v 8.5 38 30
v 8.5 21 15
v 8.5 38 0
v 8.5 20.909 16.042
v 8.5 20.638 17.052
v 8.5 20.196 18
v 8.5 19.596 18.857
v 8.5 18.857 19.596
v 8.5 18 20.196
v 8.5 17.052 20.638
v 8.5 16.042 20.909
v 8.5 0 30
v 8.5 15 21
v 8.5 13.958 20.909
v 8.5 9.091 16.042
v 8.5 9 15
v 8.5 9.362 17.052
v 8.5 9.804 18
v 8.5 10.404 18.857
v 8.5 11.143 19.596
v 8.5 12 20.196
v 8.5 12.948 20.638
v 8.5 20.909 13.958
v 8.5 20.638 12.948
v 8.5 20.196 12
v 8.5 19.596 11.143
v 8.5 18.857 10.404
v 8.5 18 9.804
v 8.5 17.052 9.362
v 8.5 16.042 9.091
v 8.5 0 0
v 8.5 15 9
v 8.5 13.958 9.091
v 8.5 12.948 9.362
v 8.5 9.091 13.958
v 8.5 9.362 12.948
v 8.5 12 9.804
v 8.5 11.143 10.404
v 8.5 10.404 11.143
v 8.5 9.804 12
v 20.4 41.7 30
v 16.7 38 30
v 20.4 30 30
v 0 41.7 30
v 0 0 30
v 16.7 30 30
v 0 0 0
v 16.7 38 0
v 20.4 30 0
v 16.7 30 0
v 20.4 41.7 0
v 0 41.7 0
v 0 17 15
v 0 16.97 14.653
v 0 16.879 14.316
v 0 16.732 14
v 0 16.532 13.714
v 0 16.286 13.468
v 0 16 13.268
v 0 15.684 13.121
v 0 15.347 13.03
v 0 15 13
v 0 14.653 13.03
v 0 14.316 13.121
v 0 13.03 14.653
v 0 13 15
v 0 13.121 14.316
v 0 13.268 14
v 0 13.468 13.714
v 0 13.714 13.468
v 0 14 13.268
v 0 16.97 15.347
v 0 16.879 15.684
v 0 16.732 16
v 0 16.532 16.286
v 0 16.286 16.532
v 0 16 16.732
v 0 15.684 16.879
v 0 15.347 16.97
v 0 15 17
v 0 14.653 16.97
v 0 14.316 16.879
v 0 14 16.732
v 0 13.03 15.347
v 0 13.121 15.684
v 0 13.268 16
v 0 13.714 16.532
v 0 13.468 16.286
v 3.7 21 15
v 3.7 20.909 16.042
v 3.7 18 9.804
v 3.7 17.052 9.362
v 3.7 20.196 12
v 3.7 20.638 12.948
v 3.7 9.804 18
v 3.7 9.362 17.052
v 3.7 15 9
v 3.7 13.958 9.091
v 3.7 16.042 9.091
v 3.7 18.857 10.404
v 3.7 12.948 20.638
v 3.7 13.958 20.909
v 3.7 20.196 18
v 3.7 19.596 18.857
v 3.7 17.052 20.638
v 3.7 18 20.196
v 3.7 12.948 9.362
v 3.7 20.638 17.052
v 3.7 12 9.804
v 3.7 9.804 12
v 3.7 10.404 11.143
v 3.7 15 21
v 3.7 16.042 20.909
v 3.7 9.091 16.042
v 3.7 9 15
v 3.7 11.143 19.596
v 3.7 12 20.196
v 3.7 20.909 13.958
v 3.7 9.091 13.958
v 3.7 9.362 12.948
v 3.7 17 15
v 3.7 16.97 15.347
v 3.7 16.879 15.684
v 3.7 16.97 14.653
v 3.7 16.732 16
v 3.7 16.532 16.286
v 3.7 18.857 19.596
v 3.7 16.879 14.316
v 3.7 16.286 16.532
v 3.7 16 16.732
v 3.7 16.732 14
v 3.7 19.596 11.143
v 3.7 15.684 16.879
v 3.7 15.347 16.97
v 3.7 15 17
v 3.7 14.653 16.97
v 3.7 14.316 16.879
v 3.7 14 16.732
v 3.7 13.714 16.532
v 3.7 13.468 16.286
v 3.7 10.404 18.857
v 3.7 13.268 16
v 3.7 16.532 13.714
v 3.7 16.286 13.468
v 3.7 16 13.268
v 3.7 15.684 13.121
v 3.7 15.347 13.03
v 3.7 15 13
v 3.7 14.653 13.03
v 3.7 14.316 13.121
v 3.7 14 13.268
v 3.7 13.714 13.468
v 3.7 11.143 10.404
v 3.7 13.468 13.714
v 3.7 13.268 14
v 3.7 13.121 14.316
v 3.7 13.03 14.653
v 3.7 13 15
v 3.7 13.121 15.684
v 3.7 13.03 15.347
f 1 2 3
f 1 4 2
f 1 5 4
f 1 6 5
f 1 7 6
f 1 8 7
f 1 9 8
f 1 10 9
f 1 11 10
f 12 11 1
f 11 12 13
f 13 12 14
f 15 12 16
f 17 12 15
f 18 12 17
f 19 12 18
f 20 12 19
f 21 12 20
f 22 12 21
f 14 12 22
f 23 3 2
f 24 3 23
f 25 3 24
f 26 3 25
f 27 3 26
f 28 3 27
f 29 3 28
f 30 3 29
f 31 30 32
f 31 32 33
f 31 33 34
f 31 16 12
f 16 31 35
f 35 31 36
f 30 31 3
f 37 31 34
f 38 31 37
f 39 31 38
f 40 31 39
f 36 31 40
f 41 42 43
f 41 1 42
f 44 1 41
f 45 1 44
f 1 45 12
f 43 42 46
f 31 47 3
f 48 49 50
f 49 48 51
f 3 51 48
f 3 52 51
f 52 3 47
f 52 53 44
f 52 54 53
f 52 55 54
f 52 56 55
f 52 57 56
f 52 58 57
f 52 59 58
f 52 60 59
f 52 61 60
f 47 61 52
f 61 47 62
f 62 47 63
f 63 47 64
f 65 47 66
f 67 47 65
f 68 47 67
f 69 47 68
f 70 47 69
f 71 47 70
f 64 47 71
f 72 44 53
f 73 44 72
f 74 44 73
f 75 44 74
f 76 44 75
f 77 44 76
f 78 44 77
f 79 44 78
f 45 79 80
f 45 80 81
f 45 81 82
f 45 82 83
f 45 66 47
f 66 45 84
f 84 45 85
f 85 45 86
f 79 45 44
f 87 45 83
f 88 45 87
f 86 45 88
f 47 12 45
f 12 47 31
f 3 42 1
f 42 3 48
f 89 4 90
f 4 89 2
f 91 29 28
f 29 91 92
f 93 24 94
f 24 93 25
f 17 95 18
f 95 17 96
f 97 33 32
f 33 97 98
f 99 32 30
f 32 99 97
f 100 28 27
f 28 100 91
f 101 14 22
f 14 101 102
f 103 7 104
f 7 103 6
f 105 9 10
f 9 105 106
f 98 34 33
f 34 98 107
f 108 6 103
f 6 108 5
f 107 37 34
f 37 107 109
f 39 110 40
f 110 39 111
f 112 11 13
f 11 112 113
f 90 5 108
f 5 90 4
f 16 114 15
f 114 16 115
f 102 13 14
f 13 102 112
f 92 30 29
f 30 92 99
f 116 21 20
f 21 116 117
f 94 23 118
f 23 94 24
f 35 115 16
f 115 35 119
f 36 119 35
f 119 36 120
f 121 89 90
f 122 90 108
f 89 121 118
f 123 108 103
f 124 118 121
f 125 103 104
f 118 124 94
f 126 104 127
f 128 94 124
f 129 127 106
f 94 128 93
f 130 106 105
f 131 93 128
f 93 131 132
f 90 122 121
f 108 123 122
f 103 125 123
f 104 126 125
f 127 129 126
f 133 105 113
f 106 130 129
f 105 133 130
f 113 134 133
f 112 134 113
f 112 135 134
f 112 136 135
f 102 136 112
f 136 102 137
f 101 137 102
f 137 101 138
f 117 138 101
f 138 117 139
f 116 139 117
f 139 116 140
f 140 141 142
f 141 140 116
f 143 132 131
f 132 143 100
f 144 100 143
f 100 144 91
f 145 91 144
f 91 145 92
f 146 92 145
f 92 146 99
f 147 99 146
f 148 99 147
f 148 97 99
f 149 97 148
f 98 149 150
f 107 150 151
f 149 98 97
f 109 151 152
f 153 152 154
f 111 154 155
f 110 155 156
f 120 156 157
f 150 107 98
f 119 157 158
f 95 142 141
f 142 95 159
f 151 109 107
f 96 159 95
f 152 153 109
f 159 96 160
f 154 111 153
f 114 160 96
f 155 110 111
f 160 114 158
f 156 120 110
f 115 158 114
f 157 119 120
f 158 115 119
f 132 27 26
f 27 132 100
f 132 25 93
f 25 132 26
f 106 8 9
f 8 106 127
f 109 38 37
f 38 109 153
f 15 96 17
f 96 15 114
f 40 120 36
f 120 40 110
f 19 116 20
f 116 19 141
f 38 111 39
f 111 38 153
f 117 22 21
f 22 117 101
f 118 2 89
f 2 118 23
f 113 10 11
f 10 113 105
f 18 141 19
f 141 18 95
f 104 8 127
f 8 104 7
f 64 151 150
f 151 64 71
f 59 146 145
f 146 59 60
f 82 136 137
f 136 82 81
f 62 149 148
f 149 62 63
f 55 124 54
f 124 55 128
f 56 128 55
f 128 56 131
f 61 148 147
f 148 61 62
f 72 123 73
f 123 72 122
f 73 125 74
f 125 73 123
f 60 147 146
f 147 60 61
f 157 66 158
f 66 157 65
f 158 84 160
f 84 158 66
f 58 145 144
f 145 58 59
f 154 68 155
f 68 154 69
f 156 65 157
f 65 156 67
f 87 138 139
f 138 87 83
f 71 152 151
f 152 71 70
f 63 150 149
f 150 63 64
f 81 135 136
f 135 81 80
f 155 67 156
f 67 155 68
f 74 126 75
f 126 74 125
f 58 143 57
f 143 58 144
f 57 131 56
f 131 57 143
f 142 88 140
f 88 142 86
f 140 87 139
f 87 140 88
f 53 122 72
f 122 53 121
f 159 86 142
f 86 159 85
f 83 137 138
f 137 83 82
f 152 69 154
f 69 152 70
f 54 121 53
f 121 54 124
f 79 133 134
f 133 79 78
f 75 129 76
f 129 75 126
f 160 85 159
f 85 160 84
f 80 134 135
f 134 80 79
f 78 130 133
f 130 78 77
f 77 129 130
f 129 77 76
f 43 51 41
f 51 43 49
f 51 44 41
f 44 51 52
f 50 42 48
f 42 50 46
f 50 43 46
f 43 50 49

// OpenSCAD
$fn=36;
//Thickness
t=3.7;
//Schraubenkopfdicke
skd=4.8;
//Thickness 1 (Achtung: mindestens t + Schrauenkopfdicke)
t1=t+skd;
//Thickness 2
t2=t;
//Dicke Holm
dh=30;
//Delta Spiegel
ds=8;
//Height
h=dh;
//Thickness Mirror
tm=8.2;
//Durchmesser Schraubenkopf
dsk=12;
//Durchmesser Schraube
dsc=4;

module schraube() {
    color("#336666")
    translate([-t,dh/2,h/2]) 
    rotate([0,90,0])
    cylinder(h=t1+t2+tm, d=dsc);
}

module schraubenkopf() {
    color("#555555")
    translate([t,dh/2,h/2]) 
    rotate([0,90,0])
    cylinder(h=t1+t2+tm, d=dsk);
}

module platte1()
{
    cube([t1,dh+ds,h]);
}

module platte1_alt()
{    
    cube([t1,dh,h]);
    color("blue")
    translate([0,dh,0]) 
    cube([t1,ds,h]);
}

color("red")
translate([0,dh+ds,0])
cube([t1+t2+tm,t,h]);

color("green")
translate([t1+tm,dh,0])
cube([t2,ds,h]);

difference()
{
    platte1_alt();    

    schraubenkopf();
    schraube();
}
